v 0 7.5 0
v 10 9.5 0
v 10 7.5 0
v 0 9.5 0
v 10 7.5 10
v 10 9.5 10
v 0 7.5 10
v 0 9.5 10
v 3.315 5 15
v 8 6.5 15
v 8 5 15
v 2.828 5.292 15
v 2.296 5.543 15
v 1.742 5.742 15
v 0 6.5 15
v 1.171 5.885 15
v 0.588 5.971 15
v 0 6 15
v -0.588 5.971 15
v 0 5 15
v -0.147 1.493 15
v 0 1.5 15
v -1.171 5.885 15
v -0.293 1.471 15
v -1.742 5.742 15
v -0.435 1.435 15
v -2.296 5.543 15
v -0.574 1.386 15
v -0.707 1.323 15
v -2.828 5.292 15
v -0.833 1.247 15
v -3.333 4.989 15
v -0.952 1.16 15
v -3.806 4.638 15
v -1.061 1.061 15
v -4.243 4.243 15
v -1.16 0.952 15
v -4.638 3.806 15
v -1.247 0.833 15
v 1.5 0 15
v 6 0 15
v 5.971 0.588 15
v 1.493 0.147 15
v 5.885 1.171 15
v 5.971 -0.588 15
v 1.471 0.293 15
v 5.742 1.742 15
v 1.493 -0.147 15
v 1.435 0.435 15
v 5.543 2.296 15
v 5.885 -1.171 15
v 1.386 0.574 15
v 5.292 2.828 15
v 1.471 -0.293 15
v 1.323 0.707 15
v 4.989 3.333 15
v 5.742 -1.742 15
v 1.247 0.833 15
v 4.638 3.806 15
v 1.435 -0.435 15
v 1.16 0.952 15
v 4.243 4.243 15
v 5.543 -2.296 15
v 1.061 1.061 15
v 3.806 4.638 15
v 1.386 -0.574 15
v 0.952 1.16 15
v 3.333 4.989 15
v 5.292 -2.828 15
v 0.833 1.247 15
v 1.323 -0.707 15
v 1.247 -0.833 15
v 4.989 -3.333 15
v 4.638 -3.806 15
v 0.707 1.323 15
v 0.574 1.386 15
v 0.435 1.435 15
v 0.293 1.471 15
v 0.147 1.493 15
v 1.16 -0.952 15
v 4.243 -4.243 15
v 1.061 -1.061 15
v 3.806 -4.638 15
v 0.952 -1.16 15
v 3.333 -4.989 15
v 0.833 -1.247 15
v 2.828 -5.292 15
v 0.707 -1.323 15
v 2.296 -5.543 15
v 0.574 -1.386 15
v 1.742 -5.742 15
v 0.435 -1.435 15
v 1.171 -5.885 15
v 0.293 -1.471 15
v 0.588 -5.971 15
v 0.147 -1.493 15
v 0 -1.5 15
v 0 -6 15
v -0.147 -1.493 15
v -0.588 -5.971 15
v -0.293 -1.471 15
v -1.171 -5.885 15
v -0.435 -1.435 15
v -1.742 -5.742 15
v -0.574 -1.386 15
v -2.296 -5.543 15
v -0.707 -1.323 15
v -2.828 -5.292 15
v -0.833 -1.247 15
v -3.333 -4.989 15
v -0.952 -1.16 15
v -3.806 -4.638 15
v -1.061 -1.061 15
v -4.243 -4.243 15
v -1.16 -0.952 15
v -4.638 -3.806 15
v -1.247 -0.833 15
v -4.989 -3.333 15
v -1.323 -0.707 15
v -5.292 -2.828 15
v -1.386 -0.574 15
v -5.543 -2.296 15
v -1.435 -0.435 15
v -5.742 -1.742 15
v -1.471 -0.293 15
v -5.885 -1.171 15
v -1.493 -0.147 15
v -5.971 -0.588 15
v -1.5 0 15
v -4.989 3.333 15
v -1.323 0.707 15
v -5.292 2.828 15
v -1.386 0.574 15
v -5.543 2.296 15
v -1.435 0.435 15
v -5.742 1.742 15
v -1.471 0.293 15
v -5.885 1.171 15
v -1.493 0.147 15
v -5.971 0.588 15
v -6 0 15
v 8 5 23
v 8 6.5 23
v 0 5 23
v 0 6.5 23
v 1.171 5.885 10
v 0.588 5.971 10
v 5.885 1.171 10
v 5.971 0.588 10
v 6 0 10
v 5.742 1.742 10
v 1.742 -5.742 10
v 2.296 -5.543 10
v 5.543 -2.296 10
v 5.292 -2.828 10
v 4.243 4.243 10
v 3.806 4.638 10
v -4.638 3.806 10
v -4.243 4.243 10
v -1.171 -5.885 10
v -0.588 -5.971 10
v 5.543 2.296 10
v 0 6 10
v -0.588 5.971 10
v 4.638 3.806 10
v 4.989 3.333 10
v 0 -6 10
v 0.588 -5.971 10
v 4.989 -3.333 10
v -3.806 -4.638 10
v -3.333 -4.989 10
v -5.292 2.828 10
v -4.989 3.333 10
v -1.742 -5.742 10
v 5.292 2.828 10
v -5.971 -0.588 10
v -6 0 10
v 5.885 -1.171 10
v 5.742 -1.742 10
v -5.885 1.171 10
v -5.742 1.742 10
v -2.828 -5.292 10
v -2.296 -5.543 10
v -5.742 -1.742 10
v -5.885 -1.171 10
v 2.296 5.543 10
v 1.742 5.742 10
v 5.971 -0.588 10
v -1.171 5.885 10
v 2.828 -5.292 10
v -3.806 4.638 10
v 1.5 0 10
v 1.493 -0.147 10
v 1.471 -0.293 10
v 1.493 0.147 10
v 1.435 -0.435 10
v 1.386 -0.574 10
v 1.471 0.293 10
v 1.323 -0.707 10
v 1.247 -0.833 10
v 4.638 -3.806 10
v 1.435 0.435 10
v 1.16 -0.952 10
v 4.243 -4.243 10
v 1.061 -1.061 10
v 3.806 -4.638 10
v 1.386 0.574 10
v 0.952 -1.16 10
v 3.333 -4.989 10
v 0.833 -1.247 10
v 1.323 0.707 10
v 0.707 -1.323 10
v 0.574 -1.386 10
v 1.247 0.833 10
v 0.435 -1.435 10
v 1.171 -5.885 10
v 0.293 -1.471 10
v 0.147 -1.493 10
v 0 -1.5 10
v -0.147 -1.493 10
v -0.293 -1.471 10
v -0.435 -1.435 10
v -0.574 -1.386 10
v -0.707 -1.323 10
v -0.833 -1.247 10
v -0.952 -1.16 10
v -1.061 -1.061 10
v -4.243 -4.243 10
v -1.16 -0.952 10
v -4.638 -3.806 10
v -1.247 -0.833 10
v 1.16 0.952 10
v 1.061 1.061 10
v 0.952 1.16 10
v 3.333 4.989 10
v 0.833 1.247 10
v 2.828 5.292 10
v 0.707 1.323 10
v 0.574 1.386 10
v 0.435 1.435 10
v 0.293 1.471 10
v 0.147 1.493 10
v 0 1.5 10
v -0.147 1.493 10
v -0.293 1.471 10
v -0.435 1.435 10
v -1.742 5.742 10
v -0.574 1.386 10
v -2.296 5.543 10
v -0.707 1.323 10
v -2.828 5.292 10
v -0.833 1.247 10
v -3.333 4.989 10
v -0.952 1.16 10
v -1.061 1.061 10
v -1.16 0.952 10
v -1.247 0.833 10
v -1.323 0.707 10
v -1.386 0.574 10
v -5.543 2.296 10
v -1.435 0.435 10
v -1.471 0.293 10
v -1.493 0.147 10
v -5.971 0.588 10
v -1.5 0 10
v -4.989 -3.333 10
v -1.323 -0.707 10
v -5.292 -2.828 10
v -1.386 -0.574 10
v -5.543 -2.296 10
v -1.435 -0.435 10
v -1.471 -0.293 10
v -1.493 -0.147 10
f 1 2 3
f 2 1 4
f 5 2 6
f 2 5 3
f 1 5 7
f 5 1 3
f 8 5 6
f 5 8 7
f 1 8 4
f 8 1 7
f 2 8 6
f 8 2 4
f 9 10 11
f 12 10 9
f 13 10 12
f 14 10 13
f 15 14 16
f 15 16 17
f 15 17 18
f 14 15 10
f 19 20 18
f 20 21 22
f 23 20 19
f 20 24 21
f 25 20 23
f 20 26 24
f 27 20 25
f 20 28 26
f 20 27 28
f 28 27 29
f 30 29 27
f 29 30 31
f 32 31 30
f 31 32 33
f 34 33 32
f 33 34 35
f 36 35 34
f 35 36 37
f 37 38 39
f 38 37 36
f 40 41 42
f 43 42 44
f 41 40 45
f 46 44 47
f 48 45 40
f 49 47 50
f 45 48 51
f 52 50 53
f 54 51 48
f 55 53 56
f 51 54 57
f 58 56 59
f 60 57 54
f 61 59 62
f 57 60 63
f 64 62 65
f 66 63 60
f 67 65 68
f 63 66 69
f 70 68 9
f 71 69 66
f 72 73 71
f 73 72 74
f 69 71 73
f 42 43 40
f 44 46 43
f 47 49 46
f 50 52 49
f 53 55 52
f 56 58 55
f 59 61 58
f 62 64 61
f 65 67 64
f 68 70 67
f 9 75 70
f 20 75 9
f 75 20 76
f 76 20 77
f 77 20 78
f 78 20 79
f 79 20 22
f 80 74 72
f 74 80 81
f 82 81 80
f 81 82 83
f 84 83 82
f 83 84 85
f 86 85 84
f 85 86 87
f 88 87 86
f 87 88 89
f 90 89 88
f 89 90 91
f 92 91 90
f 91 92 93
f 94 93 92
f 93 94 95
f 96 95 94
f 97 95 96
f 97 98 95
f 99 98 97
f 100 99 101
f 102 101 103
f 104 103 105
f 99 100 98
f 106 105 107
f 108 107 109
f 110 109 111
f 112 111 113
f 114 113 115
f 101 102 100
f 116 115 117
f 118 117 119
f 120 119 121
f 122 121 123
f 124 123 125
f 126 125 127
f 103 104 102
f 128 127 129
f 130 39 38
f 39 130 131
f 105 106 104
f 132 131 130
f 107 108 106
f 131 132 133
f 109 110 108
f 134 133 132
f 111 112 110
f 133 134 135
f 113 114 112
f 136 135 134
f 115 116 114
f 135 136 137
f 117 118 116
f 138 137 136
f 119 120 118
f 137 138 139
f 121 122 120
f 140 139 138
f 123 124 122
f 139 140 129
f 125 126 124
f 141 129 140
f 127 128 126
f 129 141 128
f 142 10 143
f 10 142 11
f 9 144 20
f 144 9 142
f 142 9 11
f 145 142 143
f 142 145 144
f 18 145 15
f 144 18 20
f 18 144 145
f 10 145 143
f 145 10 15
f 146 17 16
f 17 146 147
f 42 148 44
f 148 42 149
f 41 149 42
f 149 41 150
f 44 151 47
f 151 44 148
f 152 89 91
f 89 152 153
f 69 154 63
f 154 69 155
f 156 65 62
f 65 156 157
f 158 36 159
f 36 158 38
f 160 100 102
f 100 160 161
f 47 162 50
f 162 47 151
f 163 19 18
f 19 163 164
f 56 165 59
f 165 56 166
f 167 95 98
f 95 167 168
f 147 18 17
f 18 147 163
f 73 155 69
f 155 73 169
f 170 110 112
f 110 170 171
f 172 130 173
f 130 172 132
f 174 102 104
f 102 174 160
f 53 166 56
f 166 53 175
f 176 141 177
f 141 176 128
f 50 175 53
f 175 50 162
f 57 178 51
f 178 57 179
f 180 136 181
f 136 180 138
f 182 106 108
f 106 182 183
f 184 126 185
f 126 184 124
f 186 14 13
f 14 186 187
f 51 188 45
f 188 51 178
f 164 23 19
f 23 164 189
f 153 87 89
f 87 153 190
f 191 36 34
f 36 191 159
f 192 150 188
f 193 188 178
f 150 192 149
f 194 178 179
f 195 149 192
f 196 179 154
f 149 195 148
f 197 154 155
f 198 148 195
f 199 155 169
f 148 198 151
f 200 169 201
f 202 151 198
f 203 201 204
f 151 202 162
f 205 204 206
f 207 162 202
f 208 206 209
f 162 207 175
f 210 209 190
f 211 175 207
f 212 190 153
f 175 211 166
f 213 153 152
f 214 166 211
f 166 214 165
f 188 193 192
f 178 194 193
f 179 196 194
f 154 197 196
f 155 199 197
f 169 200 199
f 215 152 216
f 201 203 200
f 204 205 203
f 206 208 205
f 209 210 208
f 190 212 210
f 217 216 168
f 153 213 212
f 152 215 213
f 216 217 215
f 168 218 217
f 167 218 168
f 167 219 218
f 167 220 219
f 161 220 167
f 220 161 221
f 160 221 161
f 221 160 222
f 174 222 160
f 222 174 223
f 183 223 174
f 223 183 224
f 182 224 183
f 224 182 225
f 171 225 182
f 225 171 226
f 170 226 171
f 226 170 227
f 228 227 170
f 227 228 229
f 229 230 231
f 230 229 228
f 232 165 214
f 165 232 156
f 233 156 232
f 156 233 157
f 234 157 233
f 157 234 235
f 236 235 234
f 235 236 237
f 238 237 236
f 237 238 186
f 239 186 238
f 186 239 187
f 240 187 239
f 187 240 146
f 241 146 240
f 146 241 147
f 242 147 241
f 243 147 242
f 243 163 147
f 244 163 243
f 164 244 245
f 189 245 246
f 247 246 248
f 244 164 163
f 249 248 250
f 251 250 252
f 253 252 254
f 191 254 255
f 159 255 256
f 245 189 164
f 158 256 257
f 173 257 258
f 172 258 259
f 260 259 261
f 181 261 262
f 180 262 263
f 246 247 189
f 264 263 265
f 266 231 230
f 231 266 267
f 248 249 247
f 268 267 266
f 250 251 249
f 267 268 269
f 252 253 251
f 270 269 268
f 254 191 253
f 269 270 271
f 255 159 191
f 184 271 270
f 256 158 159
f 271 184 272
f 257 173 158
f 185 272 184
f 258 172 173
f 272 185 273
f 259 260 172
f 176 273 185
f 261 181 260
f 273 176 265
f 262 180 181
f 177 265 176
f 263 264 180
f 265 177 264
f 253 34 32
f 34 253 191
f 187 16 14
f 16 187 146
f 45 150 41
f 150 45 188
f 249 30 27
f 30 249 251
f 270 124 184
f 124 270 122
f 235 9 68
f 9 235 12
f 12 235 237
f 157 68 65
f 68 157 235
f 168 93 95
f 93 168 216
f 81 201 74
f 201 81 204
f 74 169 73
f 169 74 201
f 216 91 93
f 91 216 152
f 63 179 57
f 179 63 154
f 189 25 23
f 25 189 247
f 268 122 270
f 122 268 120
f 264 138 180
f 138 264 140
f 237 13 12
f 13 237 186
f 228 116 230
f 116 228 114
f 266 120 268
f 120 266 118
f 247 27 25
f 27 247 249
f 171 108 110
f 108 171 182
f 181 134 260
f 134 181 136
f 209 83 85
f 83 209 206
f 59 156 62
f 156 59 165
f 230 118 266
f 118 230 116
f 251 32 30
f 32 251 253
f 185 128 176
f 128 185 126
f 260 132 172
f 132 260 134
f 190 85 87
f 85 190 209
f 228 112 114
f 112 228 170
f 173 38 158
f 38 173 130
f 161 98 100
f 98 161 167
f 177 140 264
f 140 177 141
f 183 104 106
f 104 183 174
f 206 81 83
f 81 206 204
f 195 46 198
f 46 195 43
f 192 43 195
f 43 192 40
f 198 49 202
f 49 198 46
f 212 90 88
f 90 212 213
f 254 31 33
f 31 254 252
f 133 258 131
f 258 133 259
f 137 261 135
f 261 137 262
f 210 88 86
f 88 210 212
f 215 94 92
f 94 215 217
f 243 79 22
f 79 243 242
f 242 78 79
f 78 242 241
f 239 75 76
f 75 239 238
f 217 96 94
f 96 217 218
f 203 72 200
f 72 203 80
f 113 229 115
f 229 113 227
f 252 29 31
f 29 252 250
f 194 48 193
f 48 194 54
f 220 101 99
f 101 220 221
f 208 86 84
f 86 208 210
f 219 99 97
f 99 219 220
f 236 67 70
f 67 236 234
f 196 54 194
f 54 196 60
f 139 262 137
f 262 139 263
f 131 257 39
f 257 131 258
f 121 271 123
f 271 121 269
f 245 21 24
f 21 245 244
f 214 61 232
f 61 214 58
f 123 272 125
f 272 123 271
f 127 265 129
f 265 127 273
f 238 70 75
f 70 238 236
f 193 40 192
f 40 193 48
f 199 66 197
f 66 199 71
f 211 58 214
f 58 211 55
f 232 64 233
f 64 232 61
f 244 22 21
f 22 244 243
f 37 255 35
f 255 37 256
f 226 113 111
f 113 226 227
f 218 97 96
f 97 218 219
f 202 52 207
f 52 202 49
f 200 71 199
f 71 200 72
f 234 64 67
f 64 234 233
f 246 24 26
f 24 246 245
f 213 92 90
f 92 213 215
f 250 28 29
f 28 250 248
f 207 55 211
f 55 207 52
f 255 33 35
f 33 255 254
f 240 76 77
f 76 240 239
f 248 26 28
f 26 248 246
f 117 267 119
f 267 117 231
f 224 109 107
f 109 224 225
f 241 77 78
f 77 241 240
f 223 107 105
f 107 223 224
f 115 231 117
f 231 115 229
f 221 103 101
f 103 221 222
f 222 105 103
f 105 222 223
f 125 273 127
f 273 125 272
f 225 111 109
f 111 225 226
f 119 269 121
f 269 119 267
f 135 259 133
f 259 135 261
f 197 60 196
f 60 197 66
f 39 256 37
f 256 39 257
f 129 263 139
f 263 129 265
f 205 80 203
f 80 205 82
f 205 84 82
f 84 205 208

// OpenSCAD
// Straight hose-barb reducer: 8 mm tubing (bottom) -> 5 mm tubing (top)
// Print orientation: standing upright along +Z, centred on origin in X/Y
// Units: mm

$fn = 64;

// ---------------- Dimensions ----------------
// Tubing
t8_id    = 8;    // 8 mm tubing inner diameter
t5_id    = 5;    // 5 mm tubing inner diameter

// Barb parameters
t8_h     = 10;   // 8 mm barb height
t8_od    = 9.5;  // 8 mm barb outer diameter at top
t8_od_b  = 7.5;  // 8 mm barb outer diameter at bottom
t8_n     = 2;    // number of 8 mm barbs

t5_h     = 8;    // 5 mm barb height
t5_od    = 5.0;  // 5 mm barb outer diameter at top
t5_od_b  = 6.5;  // 5 mm barb outer diameter at bottom
t5_n     = 2;    // number of 5 mm barbs

// Bore
bore_d   = 3;    // through-bore diameter

// Collar
collar_d = 12;   // collar outer diameter
collar_h = 5;    // collar height (z = 20 to z = 25)

// Derived
t8_bottom_z = 0;
t8_top_z    = t8_bottom_z + t8_h;
t5_bottom_z = t8_top_z + collar_h;
t5_top_z    = t5_bottom_z + t5_h;
eps         = 0.5; // overshoot for clean cuts

// ---------------- Model ----------------
difference() {
    union() {
        // 8 mm barbs (sawtooth profile)
        for (i = [0 : t8_n - 1])
            translate([0, 0, t8_bottom_z])
                rotate([0, 0, 0])
                    linear_extrude(height = t8_h)
                        polygon(points = [
                            [0, t8_od_b],
                            [t8_h, t8_od_b],
                            [t8_h, t8_od],
                            [0, t8_od]
                        ]);

        // Collar
        translate([0, 0, t8_top_z])
            cylinder(d = collar_d, h = collar_h);

        // 5 mm barbs (sawtooth profile)
        for (i = [0 : t5_n - 1])
            translate([0, 0, t5_bottom_z])
                rotate([0, 0, 0])
                    linear_extrude(height = t5_h)
                        polygon(points = [
                            [0, t5_od_b],
                            [t5_h, t5_od_b],
                            [t5_h, t5_od],
                            [0, t5_od]
                        ]);
    }

    // Through bore
    translate([0, 0, t8_bottom_z - eps])
        rotate([0, 0, 0])
            cylinder(d = bore_d, h = t5_top_z + 2 * eps);
}
